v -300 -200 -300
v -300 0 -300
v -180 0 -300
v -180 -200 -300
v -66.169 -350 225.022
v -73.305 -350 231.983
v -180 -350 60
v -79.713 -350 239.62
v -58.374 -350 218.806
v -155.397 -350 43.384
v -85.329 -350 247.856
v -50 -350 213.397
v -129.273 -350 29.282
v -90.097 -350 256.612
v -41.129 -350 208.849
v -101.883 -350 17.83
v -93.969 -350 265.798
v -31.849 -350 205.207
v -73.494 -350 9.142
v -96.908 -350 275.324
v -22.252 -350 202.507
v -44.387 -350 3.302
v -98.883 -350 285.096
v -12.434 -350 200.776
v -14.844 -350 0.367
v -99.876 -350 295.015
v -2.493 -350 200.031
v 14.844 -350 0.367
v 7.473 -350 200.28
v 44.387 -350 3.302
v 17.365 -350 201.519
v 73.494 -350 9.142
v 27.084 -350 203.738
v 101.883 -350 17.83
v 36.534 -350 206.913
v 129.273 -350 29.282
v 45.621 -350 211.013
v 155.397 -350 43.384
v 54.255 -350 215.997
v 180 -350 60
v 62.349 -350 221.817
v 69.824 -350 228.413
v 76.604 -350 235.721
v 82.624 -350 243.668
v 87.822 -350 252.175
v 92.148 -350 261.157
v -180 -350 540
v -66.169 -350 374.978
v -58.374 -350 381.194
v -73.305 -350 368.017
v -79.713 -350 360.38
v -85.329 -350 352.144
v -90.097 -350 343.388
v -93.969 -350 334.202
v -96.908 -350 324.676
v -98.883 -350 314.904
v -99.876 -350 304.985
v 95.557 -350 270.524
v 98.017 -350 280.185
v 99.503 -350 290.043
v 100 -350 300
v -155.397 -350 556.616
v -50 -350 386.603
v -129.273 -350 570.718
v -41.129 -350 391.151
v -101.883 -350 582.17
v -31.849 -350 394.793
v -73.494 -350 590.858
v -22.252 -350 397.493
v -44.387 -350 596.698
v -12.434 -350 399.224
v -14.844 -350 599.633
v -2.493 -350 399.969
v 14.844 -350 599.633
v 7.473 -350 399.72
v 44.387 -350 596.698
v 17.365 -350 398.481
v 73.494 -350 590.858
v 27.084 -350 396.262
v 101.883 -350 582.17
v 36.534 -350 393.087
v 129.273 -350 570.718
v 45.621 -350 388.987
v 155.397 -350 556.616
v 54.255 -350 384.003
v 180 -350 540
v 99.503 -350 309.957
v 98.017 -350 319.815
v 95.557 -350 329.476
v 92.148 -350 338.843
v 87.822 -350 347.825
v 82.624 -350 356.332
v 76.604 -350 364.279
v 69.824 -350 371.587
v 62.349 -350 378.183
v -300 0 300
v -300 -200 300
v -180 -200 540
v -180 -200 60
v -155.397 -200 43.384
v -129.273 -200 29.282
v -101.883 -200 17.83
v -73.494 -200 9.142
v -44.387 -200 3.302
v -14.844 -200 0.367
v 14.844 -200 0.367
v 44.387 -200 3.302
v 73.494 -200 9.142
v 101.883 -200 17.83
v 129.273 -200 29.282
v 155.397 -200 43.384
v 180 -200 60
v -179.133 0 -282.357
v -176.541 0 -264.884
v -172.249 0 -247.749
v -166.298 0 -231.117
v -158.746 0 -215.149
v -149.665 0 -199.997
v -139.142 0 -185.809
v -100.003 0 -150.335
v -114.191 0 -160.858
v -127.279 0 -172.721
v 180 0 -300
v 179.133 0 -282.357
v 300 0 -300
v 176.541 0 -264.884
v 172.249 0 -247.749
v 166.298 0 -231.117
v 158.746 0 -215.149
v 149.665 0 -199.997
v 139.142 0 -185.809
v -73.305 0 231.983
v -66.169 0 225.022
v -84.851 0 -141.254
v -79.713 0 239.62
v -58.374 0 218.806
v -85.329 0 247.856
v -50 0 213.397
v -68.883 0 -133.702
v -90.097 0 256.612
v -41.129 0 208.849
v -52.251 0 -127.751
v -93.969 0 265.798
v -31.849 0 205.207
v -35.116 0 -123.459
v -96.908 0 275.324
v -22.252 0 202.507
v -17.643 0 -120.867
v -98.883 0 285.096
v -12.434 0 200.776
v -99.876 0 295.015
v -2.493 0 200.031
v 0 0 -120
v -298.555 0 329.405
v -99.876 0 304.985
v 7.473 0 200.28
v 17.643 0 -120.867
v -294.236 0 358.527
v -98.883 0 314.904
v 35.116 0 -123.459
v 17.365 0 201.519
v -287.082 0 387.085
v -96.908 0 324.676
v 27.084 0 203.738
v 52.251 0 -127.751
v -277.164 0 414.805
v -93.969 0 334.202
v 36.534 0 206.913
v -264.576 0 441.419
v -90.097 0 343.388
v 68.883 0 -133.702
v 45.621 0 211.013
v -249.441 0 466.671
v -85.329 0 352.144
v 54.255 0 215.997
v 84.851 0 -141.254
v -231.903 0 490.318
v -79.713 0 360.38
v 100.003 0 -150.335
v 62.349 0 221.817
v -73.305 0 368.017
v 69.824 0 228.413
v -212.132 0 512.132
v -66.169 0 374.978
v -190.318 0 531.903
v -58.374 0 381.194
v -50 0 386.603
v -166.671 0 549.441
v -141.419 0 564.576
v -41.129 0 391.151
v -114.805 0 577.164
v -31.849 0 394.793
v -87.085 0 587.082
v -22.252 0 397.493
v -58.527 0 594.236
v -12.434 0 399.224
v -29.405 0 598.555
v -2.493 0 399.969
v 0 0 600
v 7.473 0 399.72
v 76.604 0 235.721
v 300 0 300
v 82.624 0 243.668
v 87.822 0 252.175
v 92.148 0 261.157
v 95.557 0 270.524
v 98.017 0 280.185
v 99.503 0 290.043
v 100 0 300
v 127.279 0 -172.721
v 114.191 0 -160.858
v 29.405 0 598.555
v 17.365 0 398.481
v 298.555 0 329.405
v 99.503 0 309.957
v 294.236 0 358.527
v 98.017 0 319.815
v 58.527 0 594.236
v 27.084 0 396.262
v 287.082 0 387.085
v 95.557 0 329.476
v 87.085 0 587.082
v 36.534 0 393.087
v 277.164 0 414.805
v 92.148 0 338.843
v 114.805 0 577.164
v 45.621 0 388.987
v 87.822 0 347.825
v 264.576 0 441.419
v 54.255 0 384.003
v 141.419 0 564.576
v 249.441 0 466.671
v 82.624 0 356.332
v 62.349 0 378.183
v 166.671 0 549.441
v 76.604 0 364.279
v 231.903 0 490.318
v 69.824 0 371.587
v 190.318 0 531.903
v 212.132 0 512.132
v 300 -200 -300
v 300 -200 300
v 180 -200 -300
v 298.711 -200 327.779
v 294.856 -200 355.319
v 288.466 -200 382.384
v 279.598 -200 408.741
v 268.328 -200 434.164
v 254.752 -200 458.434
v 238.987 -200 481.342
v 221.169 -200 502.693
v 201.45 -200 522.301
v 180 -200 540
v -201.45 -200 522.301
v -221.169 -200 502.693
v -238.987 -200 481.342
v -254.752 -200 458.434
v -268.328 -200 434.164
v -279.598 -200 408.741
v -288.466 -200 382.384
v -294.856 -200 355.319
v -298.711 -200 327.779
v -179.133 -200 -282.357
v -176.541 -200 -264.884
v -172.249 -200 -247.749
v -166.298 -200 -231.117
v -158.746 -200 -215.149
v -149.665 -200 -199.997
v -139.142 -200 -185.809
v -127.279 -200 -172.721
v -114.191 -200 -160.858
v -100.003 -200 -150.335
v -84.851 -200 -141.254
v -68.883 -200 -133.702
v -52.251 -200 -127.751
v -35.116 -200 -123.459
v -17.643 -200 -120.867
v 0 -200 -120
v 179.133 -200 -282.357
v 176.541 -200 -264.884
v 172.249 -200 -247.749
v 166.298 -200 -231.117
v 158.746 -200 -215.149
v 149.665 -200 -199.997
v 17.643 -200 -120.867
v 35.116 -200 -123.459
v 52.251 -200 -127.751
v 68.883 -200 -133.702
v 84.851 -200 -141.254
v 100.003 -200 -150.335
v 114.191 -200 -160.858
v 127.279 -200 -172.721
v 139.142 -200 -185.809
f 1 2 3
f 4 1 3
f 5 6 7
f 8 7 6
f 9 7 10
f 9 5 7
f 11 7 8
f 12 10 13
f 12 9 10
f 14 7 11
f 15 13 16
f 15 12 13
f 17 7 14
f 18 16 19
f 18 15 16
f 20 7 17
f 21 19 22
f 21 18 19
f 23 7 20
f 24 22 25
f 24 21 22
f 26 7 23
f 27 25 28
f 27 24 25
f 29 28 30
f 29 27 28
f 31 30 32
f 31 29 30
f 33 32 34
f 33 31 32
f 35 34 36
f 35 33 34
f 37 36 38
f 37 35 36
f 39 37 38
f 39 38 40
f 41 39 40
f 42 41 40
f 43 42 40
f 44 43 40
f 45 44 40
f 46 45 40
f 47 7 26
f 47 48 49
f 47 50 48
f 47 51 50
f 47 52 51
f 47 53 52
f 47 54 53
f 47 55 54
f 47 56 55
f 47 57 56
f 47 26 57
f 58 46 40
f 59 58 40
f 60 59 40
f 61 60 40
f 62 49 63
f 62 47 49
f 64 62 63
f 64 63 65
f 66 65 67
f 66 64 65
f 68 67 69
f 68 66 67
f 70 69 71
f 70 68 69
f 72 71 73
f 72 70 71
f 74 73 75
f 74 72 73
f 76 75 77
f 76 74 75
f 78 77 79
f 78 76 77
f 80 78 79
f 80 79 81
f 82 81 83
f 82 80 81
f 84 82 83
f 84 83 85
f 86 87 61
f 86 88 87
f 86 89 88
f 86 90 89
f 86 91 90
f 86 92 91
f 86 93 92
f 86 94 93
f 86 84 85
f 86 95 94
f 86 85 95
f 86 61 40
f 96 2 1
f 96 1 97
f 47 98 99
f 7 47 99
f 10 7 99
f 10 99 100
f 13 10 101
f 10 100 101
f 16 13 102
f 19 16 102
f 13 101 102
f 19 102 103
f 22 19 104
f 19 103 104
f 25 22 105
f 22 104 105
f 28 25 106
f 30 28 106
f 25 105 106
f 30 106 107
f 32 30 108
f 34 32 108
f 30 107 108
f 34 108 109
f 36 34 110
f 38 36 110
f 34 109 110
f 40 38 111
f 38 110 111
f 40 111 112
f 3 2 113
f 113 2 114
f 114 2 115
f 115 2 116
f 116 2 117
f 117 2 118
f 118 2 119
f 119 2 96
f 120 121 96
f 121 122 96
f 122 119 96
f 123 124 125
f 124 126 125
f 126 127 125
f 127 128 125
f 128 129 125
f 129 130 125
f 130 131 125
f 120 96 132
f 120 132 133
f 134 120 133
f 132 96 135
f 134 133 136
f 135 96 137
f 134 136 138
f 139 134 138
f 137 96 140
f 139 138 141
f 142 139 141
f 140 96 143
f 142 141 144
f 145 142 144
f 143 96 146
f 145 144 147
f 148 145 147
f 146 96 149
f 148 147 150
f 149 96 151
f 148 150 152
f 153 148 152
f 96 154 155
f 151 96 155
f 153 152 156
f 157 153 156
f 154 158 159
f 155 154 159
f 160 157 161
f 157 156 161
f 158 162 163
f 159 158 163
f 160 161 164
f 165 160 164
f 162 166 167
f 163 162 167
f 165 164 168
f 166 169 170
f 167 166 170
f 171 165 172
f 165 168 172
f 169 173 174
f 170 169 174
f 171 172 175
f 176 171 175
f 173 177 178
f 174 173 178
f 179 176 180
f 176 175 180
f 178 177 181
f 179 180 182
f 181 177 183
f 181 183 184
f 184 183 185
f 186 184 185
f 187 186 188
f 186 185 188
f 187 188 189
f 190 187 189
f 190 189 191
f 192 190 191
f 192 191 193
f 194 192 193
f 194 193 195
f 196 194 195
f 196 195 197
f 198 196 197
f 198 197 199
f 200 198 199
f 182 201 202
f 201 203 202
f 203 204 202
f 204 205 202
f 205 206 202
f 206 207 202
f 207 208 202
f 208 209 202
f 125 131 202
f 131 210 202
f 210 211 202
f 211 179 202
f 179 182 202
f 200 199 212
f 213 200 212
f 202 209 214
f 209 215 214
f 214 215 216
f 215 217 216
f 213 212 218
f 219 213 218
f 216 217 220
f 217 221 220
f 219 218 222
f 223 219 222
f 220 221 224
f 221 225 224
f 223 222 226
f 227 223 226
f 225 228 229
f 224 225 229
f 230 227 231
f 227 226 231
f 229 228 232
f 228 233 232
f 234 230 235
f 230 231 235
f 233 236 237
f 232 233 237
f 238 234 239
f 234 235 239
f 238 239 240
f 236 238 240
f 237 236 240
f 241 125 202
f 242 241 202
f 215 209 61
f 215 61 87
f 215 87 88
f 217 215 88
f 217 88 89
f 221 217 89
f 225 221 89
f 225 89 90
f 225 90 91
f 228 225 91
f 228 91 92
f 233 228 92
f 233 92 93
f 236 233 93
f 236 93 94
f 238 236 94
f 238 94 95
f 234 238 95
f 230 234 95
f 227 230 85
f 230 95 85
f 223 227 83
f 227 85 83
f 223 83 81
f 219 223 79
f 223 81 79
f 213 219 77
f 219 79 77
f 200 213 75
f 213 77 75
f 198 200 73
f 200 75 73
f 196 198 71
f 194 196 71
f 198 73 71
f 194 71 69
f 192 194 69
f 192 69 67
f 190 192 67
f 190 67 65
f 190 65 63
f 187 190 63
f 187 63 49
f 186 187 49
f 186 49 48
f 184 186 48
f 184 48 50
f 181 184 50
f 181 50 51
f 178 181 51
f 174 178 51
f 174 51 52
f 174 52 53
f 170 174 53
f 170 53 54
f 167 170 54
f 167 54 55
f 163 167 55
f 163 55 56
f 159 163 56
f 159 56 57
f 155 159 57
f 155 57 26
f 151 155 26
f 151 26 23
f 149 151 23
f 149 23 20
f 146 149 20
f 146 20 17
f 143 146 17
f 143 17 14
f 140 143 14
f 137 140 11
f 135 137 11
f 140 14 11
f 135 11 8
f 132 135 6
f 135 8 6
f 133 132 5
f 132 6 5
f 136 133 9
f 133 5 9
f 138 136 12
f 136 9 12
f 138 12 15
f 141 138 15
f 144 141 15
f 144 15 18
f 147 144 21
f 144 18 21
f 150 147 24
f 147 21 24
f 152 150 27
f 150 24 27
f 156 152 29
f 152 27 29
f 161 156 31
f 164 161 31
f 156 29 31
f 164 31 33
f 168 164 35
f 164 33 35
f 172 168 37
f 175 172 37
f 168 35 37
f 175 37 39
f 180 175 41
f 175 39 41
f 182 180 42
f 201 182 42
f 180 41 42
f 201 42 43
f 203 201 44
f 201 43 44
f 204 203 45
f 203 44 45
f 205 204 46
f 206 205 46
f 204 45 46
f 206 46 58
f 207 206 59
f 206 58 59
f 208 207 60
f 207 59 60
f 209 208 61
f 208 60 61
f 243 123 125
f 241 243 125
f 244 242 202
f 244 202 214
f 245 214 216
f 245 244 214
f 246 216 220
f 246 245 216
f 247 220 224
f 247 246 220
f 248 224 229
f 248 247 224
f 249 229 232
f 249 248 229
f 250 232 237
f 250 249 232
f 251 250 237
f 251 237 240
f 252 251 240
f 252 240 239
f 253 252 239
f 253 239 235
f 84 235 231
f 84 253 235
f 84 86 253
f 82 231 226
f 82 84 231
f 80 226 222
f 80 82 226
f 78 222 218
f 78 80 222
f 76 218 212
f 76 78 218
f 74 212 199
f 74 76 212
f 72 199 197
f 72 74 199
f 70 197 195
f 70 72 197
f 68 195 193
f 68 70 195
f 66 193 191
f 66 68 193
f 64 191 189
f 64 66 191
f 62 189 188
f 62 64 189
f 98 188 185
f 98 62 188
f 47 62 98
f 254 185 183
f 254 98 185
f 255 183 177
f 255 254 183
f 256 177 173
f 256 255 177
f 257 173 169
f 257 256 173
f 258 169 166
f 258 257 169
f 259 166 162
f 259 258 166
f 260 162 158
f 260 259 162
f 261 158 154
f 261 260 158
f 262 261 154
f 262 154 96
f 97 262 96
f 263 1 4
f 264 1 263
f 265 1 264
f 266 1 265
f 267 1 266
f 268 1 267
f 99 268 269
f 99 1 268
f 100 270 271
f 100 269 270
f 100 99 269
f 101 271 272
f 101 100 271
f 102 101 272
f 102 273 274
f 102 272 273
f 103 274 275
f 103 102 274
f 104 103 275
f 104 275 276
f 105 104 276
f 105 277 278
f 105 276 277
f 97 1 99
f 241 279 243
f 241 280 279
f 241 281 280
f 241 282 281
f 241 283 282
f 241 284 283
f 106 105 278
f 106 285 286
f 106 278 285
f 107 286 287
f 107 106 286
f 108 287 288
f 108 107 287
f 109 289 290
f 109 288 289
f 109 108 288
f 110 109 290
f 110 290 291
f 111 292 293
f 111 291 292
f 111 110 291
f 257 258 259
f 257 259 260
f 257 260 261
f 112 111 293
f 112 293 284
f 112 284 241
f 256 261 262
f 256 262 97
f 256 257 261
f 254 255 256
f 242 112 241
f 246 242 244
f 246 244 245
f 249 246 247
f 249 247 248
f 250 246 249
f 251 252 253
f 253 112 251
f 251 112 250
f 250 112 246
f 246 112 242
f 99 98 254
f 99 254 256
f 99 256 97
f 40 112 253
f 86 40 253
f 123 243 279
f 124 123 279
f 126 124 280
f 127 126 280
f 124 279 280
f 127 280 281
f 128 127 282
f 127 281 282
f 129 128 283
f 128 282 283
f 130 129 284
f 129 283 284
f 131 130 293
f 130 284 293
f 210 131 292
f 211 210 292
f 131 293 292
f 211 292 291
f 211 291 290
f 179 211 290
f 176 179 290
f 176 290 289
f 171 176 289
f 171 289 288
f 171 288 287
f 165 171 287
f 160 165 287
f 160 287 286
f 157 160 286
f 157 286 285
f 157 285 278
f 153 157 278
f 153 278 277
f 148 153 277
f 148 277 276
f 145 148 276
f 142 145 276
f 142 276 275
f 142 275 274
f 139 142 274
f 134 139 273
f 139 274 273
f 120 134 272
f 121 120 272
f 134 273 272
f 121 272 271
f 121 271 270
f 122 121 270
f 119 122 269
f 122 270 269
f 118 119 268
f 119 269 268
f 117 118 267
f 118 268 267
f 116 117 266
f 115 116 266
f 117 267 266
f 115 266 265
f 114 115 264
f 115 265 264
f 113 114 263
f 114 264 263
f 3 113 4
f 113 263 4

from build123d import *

# Parameters (mm, degrees)
F0_W     = 600
F0_H     = 600
F1_DEPTH = 200
F2_R     = 180
F3_DEPTH = 200.001
F5_DEPTH = 200
F7_DEPTH = 150
F8_R     = 100
F9_DEPTH = 350.001


with BuildPart() as f1:
    # F0 (on Front) → F1 (new body)
    with BuildSketch(Plane.XZ):
        Rectangle(F0_W, F0_H)
    extrude(amount=F1_DEPTH)

    # F2 (on face) → F3 (cut, through all)
    with BuildSketch(Plane.XZ.offset(200)):
        with Locations((0, -300)):
            Circle(F2_R)
    extrude(amount=-F3_DEPTH, mode=Mode.SUBTRACT)

    # F4 (on face) → F5 (join)
    with BuildSketch(Plane.XZ.offset(200)):
        with BuildLine():
            Line((-300, 300), (300, 300))
            ThreePointArc((300, 300), (0, 600), (-300, 300))
        make_face()
    extrude(amount=-F5_DEPTH)

    # F6 (on face) → F7 (join)
    with BuildSketch(Plane.XZ.offset(200)):
        with BuildLine():
            Line((-180, 540), (-180, 60))
            ThreePointArc((-180, 60), (0, 0), (180, 60))
            Line((180, 60), (180, 540))
            ThreePointArc((180, 540), (0, 600), (-180, 540))
        make_face()
    extrude(amount=F7_DEPTH)

    # F8 (on face) → F9 (cut, through all)
    with BuildSketch(Plane.XZ.offset(350)):
        with Locations((0, 300)):
            Circle(F8_R)
    extrude(amount=-F9_DEPTH, mode=Mode.SUBTRACT)


solid = f1.part
